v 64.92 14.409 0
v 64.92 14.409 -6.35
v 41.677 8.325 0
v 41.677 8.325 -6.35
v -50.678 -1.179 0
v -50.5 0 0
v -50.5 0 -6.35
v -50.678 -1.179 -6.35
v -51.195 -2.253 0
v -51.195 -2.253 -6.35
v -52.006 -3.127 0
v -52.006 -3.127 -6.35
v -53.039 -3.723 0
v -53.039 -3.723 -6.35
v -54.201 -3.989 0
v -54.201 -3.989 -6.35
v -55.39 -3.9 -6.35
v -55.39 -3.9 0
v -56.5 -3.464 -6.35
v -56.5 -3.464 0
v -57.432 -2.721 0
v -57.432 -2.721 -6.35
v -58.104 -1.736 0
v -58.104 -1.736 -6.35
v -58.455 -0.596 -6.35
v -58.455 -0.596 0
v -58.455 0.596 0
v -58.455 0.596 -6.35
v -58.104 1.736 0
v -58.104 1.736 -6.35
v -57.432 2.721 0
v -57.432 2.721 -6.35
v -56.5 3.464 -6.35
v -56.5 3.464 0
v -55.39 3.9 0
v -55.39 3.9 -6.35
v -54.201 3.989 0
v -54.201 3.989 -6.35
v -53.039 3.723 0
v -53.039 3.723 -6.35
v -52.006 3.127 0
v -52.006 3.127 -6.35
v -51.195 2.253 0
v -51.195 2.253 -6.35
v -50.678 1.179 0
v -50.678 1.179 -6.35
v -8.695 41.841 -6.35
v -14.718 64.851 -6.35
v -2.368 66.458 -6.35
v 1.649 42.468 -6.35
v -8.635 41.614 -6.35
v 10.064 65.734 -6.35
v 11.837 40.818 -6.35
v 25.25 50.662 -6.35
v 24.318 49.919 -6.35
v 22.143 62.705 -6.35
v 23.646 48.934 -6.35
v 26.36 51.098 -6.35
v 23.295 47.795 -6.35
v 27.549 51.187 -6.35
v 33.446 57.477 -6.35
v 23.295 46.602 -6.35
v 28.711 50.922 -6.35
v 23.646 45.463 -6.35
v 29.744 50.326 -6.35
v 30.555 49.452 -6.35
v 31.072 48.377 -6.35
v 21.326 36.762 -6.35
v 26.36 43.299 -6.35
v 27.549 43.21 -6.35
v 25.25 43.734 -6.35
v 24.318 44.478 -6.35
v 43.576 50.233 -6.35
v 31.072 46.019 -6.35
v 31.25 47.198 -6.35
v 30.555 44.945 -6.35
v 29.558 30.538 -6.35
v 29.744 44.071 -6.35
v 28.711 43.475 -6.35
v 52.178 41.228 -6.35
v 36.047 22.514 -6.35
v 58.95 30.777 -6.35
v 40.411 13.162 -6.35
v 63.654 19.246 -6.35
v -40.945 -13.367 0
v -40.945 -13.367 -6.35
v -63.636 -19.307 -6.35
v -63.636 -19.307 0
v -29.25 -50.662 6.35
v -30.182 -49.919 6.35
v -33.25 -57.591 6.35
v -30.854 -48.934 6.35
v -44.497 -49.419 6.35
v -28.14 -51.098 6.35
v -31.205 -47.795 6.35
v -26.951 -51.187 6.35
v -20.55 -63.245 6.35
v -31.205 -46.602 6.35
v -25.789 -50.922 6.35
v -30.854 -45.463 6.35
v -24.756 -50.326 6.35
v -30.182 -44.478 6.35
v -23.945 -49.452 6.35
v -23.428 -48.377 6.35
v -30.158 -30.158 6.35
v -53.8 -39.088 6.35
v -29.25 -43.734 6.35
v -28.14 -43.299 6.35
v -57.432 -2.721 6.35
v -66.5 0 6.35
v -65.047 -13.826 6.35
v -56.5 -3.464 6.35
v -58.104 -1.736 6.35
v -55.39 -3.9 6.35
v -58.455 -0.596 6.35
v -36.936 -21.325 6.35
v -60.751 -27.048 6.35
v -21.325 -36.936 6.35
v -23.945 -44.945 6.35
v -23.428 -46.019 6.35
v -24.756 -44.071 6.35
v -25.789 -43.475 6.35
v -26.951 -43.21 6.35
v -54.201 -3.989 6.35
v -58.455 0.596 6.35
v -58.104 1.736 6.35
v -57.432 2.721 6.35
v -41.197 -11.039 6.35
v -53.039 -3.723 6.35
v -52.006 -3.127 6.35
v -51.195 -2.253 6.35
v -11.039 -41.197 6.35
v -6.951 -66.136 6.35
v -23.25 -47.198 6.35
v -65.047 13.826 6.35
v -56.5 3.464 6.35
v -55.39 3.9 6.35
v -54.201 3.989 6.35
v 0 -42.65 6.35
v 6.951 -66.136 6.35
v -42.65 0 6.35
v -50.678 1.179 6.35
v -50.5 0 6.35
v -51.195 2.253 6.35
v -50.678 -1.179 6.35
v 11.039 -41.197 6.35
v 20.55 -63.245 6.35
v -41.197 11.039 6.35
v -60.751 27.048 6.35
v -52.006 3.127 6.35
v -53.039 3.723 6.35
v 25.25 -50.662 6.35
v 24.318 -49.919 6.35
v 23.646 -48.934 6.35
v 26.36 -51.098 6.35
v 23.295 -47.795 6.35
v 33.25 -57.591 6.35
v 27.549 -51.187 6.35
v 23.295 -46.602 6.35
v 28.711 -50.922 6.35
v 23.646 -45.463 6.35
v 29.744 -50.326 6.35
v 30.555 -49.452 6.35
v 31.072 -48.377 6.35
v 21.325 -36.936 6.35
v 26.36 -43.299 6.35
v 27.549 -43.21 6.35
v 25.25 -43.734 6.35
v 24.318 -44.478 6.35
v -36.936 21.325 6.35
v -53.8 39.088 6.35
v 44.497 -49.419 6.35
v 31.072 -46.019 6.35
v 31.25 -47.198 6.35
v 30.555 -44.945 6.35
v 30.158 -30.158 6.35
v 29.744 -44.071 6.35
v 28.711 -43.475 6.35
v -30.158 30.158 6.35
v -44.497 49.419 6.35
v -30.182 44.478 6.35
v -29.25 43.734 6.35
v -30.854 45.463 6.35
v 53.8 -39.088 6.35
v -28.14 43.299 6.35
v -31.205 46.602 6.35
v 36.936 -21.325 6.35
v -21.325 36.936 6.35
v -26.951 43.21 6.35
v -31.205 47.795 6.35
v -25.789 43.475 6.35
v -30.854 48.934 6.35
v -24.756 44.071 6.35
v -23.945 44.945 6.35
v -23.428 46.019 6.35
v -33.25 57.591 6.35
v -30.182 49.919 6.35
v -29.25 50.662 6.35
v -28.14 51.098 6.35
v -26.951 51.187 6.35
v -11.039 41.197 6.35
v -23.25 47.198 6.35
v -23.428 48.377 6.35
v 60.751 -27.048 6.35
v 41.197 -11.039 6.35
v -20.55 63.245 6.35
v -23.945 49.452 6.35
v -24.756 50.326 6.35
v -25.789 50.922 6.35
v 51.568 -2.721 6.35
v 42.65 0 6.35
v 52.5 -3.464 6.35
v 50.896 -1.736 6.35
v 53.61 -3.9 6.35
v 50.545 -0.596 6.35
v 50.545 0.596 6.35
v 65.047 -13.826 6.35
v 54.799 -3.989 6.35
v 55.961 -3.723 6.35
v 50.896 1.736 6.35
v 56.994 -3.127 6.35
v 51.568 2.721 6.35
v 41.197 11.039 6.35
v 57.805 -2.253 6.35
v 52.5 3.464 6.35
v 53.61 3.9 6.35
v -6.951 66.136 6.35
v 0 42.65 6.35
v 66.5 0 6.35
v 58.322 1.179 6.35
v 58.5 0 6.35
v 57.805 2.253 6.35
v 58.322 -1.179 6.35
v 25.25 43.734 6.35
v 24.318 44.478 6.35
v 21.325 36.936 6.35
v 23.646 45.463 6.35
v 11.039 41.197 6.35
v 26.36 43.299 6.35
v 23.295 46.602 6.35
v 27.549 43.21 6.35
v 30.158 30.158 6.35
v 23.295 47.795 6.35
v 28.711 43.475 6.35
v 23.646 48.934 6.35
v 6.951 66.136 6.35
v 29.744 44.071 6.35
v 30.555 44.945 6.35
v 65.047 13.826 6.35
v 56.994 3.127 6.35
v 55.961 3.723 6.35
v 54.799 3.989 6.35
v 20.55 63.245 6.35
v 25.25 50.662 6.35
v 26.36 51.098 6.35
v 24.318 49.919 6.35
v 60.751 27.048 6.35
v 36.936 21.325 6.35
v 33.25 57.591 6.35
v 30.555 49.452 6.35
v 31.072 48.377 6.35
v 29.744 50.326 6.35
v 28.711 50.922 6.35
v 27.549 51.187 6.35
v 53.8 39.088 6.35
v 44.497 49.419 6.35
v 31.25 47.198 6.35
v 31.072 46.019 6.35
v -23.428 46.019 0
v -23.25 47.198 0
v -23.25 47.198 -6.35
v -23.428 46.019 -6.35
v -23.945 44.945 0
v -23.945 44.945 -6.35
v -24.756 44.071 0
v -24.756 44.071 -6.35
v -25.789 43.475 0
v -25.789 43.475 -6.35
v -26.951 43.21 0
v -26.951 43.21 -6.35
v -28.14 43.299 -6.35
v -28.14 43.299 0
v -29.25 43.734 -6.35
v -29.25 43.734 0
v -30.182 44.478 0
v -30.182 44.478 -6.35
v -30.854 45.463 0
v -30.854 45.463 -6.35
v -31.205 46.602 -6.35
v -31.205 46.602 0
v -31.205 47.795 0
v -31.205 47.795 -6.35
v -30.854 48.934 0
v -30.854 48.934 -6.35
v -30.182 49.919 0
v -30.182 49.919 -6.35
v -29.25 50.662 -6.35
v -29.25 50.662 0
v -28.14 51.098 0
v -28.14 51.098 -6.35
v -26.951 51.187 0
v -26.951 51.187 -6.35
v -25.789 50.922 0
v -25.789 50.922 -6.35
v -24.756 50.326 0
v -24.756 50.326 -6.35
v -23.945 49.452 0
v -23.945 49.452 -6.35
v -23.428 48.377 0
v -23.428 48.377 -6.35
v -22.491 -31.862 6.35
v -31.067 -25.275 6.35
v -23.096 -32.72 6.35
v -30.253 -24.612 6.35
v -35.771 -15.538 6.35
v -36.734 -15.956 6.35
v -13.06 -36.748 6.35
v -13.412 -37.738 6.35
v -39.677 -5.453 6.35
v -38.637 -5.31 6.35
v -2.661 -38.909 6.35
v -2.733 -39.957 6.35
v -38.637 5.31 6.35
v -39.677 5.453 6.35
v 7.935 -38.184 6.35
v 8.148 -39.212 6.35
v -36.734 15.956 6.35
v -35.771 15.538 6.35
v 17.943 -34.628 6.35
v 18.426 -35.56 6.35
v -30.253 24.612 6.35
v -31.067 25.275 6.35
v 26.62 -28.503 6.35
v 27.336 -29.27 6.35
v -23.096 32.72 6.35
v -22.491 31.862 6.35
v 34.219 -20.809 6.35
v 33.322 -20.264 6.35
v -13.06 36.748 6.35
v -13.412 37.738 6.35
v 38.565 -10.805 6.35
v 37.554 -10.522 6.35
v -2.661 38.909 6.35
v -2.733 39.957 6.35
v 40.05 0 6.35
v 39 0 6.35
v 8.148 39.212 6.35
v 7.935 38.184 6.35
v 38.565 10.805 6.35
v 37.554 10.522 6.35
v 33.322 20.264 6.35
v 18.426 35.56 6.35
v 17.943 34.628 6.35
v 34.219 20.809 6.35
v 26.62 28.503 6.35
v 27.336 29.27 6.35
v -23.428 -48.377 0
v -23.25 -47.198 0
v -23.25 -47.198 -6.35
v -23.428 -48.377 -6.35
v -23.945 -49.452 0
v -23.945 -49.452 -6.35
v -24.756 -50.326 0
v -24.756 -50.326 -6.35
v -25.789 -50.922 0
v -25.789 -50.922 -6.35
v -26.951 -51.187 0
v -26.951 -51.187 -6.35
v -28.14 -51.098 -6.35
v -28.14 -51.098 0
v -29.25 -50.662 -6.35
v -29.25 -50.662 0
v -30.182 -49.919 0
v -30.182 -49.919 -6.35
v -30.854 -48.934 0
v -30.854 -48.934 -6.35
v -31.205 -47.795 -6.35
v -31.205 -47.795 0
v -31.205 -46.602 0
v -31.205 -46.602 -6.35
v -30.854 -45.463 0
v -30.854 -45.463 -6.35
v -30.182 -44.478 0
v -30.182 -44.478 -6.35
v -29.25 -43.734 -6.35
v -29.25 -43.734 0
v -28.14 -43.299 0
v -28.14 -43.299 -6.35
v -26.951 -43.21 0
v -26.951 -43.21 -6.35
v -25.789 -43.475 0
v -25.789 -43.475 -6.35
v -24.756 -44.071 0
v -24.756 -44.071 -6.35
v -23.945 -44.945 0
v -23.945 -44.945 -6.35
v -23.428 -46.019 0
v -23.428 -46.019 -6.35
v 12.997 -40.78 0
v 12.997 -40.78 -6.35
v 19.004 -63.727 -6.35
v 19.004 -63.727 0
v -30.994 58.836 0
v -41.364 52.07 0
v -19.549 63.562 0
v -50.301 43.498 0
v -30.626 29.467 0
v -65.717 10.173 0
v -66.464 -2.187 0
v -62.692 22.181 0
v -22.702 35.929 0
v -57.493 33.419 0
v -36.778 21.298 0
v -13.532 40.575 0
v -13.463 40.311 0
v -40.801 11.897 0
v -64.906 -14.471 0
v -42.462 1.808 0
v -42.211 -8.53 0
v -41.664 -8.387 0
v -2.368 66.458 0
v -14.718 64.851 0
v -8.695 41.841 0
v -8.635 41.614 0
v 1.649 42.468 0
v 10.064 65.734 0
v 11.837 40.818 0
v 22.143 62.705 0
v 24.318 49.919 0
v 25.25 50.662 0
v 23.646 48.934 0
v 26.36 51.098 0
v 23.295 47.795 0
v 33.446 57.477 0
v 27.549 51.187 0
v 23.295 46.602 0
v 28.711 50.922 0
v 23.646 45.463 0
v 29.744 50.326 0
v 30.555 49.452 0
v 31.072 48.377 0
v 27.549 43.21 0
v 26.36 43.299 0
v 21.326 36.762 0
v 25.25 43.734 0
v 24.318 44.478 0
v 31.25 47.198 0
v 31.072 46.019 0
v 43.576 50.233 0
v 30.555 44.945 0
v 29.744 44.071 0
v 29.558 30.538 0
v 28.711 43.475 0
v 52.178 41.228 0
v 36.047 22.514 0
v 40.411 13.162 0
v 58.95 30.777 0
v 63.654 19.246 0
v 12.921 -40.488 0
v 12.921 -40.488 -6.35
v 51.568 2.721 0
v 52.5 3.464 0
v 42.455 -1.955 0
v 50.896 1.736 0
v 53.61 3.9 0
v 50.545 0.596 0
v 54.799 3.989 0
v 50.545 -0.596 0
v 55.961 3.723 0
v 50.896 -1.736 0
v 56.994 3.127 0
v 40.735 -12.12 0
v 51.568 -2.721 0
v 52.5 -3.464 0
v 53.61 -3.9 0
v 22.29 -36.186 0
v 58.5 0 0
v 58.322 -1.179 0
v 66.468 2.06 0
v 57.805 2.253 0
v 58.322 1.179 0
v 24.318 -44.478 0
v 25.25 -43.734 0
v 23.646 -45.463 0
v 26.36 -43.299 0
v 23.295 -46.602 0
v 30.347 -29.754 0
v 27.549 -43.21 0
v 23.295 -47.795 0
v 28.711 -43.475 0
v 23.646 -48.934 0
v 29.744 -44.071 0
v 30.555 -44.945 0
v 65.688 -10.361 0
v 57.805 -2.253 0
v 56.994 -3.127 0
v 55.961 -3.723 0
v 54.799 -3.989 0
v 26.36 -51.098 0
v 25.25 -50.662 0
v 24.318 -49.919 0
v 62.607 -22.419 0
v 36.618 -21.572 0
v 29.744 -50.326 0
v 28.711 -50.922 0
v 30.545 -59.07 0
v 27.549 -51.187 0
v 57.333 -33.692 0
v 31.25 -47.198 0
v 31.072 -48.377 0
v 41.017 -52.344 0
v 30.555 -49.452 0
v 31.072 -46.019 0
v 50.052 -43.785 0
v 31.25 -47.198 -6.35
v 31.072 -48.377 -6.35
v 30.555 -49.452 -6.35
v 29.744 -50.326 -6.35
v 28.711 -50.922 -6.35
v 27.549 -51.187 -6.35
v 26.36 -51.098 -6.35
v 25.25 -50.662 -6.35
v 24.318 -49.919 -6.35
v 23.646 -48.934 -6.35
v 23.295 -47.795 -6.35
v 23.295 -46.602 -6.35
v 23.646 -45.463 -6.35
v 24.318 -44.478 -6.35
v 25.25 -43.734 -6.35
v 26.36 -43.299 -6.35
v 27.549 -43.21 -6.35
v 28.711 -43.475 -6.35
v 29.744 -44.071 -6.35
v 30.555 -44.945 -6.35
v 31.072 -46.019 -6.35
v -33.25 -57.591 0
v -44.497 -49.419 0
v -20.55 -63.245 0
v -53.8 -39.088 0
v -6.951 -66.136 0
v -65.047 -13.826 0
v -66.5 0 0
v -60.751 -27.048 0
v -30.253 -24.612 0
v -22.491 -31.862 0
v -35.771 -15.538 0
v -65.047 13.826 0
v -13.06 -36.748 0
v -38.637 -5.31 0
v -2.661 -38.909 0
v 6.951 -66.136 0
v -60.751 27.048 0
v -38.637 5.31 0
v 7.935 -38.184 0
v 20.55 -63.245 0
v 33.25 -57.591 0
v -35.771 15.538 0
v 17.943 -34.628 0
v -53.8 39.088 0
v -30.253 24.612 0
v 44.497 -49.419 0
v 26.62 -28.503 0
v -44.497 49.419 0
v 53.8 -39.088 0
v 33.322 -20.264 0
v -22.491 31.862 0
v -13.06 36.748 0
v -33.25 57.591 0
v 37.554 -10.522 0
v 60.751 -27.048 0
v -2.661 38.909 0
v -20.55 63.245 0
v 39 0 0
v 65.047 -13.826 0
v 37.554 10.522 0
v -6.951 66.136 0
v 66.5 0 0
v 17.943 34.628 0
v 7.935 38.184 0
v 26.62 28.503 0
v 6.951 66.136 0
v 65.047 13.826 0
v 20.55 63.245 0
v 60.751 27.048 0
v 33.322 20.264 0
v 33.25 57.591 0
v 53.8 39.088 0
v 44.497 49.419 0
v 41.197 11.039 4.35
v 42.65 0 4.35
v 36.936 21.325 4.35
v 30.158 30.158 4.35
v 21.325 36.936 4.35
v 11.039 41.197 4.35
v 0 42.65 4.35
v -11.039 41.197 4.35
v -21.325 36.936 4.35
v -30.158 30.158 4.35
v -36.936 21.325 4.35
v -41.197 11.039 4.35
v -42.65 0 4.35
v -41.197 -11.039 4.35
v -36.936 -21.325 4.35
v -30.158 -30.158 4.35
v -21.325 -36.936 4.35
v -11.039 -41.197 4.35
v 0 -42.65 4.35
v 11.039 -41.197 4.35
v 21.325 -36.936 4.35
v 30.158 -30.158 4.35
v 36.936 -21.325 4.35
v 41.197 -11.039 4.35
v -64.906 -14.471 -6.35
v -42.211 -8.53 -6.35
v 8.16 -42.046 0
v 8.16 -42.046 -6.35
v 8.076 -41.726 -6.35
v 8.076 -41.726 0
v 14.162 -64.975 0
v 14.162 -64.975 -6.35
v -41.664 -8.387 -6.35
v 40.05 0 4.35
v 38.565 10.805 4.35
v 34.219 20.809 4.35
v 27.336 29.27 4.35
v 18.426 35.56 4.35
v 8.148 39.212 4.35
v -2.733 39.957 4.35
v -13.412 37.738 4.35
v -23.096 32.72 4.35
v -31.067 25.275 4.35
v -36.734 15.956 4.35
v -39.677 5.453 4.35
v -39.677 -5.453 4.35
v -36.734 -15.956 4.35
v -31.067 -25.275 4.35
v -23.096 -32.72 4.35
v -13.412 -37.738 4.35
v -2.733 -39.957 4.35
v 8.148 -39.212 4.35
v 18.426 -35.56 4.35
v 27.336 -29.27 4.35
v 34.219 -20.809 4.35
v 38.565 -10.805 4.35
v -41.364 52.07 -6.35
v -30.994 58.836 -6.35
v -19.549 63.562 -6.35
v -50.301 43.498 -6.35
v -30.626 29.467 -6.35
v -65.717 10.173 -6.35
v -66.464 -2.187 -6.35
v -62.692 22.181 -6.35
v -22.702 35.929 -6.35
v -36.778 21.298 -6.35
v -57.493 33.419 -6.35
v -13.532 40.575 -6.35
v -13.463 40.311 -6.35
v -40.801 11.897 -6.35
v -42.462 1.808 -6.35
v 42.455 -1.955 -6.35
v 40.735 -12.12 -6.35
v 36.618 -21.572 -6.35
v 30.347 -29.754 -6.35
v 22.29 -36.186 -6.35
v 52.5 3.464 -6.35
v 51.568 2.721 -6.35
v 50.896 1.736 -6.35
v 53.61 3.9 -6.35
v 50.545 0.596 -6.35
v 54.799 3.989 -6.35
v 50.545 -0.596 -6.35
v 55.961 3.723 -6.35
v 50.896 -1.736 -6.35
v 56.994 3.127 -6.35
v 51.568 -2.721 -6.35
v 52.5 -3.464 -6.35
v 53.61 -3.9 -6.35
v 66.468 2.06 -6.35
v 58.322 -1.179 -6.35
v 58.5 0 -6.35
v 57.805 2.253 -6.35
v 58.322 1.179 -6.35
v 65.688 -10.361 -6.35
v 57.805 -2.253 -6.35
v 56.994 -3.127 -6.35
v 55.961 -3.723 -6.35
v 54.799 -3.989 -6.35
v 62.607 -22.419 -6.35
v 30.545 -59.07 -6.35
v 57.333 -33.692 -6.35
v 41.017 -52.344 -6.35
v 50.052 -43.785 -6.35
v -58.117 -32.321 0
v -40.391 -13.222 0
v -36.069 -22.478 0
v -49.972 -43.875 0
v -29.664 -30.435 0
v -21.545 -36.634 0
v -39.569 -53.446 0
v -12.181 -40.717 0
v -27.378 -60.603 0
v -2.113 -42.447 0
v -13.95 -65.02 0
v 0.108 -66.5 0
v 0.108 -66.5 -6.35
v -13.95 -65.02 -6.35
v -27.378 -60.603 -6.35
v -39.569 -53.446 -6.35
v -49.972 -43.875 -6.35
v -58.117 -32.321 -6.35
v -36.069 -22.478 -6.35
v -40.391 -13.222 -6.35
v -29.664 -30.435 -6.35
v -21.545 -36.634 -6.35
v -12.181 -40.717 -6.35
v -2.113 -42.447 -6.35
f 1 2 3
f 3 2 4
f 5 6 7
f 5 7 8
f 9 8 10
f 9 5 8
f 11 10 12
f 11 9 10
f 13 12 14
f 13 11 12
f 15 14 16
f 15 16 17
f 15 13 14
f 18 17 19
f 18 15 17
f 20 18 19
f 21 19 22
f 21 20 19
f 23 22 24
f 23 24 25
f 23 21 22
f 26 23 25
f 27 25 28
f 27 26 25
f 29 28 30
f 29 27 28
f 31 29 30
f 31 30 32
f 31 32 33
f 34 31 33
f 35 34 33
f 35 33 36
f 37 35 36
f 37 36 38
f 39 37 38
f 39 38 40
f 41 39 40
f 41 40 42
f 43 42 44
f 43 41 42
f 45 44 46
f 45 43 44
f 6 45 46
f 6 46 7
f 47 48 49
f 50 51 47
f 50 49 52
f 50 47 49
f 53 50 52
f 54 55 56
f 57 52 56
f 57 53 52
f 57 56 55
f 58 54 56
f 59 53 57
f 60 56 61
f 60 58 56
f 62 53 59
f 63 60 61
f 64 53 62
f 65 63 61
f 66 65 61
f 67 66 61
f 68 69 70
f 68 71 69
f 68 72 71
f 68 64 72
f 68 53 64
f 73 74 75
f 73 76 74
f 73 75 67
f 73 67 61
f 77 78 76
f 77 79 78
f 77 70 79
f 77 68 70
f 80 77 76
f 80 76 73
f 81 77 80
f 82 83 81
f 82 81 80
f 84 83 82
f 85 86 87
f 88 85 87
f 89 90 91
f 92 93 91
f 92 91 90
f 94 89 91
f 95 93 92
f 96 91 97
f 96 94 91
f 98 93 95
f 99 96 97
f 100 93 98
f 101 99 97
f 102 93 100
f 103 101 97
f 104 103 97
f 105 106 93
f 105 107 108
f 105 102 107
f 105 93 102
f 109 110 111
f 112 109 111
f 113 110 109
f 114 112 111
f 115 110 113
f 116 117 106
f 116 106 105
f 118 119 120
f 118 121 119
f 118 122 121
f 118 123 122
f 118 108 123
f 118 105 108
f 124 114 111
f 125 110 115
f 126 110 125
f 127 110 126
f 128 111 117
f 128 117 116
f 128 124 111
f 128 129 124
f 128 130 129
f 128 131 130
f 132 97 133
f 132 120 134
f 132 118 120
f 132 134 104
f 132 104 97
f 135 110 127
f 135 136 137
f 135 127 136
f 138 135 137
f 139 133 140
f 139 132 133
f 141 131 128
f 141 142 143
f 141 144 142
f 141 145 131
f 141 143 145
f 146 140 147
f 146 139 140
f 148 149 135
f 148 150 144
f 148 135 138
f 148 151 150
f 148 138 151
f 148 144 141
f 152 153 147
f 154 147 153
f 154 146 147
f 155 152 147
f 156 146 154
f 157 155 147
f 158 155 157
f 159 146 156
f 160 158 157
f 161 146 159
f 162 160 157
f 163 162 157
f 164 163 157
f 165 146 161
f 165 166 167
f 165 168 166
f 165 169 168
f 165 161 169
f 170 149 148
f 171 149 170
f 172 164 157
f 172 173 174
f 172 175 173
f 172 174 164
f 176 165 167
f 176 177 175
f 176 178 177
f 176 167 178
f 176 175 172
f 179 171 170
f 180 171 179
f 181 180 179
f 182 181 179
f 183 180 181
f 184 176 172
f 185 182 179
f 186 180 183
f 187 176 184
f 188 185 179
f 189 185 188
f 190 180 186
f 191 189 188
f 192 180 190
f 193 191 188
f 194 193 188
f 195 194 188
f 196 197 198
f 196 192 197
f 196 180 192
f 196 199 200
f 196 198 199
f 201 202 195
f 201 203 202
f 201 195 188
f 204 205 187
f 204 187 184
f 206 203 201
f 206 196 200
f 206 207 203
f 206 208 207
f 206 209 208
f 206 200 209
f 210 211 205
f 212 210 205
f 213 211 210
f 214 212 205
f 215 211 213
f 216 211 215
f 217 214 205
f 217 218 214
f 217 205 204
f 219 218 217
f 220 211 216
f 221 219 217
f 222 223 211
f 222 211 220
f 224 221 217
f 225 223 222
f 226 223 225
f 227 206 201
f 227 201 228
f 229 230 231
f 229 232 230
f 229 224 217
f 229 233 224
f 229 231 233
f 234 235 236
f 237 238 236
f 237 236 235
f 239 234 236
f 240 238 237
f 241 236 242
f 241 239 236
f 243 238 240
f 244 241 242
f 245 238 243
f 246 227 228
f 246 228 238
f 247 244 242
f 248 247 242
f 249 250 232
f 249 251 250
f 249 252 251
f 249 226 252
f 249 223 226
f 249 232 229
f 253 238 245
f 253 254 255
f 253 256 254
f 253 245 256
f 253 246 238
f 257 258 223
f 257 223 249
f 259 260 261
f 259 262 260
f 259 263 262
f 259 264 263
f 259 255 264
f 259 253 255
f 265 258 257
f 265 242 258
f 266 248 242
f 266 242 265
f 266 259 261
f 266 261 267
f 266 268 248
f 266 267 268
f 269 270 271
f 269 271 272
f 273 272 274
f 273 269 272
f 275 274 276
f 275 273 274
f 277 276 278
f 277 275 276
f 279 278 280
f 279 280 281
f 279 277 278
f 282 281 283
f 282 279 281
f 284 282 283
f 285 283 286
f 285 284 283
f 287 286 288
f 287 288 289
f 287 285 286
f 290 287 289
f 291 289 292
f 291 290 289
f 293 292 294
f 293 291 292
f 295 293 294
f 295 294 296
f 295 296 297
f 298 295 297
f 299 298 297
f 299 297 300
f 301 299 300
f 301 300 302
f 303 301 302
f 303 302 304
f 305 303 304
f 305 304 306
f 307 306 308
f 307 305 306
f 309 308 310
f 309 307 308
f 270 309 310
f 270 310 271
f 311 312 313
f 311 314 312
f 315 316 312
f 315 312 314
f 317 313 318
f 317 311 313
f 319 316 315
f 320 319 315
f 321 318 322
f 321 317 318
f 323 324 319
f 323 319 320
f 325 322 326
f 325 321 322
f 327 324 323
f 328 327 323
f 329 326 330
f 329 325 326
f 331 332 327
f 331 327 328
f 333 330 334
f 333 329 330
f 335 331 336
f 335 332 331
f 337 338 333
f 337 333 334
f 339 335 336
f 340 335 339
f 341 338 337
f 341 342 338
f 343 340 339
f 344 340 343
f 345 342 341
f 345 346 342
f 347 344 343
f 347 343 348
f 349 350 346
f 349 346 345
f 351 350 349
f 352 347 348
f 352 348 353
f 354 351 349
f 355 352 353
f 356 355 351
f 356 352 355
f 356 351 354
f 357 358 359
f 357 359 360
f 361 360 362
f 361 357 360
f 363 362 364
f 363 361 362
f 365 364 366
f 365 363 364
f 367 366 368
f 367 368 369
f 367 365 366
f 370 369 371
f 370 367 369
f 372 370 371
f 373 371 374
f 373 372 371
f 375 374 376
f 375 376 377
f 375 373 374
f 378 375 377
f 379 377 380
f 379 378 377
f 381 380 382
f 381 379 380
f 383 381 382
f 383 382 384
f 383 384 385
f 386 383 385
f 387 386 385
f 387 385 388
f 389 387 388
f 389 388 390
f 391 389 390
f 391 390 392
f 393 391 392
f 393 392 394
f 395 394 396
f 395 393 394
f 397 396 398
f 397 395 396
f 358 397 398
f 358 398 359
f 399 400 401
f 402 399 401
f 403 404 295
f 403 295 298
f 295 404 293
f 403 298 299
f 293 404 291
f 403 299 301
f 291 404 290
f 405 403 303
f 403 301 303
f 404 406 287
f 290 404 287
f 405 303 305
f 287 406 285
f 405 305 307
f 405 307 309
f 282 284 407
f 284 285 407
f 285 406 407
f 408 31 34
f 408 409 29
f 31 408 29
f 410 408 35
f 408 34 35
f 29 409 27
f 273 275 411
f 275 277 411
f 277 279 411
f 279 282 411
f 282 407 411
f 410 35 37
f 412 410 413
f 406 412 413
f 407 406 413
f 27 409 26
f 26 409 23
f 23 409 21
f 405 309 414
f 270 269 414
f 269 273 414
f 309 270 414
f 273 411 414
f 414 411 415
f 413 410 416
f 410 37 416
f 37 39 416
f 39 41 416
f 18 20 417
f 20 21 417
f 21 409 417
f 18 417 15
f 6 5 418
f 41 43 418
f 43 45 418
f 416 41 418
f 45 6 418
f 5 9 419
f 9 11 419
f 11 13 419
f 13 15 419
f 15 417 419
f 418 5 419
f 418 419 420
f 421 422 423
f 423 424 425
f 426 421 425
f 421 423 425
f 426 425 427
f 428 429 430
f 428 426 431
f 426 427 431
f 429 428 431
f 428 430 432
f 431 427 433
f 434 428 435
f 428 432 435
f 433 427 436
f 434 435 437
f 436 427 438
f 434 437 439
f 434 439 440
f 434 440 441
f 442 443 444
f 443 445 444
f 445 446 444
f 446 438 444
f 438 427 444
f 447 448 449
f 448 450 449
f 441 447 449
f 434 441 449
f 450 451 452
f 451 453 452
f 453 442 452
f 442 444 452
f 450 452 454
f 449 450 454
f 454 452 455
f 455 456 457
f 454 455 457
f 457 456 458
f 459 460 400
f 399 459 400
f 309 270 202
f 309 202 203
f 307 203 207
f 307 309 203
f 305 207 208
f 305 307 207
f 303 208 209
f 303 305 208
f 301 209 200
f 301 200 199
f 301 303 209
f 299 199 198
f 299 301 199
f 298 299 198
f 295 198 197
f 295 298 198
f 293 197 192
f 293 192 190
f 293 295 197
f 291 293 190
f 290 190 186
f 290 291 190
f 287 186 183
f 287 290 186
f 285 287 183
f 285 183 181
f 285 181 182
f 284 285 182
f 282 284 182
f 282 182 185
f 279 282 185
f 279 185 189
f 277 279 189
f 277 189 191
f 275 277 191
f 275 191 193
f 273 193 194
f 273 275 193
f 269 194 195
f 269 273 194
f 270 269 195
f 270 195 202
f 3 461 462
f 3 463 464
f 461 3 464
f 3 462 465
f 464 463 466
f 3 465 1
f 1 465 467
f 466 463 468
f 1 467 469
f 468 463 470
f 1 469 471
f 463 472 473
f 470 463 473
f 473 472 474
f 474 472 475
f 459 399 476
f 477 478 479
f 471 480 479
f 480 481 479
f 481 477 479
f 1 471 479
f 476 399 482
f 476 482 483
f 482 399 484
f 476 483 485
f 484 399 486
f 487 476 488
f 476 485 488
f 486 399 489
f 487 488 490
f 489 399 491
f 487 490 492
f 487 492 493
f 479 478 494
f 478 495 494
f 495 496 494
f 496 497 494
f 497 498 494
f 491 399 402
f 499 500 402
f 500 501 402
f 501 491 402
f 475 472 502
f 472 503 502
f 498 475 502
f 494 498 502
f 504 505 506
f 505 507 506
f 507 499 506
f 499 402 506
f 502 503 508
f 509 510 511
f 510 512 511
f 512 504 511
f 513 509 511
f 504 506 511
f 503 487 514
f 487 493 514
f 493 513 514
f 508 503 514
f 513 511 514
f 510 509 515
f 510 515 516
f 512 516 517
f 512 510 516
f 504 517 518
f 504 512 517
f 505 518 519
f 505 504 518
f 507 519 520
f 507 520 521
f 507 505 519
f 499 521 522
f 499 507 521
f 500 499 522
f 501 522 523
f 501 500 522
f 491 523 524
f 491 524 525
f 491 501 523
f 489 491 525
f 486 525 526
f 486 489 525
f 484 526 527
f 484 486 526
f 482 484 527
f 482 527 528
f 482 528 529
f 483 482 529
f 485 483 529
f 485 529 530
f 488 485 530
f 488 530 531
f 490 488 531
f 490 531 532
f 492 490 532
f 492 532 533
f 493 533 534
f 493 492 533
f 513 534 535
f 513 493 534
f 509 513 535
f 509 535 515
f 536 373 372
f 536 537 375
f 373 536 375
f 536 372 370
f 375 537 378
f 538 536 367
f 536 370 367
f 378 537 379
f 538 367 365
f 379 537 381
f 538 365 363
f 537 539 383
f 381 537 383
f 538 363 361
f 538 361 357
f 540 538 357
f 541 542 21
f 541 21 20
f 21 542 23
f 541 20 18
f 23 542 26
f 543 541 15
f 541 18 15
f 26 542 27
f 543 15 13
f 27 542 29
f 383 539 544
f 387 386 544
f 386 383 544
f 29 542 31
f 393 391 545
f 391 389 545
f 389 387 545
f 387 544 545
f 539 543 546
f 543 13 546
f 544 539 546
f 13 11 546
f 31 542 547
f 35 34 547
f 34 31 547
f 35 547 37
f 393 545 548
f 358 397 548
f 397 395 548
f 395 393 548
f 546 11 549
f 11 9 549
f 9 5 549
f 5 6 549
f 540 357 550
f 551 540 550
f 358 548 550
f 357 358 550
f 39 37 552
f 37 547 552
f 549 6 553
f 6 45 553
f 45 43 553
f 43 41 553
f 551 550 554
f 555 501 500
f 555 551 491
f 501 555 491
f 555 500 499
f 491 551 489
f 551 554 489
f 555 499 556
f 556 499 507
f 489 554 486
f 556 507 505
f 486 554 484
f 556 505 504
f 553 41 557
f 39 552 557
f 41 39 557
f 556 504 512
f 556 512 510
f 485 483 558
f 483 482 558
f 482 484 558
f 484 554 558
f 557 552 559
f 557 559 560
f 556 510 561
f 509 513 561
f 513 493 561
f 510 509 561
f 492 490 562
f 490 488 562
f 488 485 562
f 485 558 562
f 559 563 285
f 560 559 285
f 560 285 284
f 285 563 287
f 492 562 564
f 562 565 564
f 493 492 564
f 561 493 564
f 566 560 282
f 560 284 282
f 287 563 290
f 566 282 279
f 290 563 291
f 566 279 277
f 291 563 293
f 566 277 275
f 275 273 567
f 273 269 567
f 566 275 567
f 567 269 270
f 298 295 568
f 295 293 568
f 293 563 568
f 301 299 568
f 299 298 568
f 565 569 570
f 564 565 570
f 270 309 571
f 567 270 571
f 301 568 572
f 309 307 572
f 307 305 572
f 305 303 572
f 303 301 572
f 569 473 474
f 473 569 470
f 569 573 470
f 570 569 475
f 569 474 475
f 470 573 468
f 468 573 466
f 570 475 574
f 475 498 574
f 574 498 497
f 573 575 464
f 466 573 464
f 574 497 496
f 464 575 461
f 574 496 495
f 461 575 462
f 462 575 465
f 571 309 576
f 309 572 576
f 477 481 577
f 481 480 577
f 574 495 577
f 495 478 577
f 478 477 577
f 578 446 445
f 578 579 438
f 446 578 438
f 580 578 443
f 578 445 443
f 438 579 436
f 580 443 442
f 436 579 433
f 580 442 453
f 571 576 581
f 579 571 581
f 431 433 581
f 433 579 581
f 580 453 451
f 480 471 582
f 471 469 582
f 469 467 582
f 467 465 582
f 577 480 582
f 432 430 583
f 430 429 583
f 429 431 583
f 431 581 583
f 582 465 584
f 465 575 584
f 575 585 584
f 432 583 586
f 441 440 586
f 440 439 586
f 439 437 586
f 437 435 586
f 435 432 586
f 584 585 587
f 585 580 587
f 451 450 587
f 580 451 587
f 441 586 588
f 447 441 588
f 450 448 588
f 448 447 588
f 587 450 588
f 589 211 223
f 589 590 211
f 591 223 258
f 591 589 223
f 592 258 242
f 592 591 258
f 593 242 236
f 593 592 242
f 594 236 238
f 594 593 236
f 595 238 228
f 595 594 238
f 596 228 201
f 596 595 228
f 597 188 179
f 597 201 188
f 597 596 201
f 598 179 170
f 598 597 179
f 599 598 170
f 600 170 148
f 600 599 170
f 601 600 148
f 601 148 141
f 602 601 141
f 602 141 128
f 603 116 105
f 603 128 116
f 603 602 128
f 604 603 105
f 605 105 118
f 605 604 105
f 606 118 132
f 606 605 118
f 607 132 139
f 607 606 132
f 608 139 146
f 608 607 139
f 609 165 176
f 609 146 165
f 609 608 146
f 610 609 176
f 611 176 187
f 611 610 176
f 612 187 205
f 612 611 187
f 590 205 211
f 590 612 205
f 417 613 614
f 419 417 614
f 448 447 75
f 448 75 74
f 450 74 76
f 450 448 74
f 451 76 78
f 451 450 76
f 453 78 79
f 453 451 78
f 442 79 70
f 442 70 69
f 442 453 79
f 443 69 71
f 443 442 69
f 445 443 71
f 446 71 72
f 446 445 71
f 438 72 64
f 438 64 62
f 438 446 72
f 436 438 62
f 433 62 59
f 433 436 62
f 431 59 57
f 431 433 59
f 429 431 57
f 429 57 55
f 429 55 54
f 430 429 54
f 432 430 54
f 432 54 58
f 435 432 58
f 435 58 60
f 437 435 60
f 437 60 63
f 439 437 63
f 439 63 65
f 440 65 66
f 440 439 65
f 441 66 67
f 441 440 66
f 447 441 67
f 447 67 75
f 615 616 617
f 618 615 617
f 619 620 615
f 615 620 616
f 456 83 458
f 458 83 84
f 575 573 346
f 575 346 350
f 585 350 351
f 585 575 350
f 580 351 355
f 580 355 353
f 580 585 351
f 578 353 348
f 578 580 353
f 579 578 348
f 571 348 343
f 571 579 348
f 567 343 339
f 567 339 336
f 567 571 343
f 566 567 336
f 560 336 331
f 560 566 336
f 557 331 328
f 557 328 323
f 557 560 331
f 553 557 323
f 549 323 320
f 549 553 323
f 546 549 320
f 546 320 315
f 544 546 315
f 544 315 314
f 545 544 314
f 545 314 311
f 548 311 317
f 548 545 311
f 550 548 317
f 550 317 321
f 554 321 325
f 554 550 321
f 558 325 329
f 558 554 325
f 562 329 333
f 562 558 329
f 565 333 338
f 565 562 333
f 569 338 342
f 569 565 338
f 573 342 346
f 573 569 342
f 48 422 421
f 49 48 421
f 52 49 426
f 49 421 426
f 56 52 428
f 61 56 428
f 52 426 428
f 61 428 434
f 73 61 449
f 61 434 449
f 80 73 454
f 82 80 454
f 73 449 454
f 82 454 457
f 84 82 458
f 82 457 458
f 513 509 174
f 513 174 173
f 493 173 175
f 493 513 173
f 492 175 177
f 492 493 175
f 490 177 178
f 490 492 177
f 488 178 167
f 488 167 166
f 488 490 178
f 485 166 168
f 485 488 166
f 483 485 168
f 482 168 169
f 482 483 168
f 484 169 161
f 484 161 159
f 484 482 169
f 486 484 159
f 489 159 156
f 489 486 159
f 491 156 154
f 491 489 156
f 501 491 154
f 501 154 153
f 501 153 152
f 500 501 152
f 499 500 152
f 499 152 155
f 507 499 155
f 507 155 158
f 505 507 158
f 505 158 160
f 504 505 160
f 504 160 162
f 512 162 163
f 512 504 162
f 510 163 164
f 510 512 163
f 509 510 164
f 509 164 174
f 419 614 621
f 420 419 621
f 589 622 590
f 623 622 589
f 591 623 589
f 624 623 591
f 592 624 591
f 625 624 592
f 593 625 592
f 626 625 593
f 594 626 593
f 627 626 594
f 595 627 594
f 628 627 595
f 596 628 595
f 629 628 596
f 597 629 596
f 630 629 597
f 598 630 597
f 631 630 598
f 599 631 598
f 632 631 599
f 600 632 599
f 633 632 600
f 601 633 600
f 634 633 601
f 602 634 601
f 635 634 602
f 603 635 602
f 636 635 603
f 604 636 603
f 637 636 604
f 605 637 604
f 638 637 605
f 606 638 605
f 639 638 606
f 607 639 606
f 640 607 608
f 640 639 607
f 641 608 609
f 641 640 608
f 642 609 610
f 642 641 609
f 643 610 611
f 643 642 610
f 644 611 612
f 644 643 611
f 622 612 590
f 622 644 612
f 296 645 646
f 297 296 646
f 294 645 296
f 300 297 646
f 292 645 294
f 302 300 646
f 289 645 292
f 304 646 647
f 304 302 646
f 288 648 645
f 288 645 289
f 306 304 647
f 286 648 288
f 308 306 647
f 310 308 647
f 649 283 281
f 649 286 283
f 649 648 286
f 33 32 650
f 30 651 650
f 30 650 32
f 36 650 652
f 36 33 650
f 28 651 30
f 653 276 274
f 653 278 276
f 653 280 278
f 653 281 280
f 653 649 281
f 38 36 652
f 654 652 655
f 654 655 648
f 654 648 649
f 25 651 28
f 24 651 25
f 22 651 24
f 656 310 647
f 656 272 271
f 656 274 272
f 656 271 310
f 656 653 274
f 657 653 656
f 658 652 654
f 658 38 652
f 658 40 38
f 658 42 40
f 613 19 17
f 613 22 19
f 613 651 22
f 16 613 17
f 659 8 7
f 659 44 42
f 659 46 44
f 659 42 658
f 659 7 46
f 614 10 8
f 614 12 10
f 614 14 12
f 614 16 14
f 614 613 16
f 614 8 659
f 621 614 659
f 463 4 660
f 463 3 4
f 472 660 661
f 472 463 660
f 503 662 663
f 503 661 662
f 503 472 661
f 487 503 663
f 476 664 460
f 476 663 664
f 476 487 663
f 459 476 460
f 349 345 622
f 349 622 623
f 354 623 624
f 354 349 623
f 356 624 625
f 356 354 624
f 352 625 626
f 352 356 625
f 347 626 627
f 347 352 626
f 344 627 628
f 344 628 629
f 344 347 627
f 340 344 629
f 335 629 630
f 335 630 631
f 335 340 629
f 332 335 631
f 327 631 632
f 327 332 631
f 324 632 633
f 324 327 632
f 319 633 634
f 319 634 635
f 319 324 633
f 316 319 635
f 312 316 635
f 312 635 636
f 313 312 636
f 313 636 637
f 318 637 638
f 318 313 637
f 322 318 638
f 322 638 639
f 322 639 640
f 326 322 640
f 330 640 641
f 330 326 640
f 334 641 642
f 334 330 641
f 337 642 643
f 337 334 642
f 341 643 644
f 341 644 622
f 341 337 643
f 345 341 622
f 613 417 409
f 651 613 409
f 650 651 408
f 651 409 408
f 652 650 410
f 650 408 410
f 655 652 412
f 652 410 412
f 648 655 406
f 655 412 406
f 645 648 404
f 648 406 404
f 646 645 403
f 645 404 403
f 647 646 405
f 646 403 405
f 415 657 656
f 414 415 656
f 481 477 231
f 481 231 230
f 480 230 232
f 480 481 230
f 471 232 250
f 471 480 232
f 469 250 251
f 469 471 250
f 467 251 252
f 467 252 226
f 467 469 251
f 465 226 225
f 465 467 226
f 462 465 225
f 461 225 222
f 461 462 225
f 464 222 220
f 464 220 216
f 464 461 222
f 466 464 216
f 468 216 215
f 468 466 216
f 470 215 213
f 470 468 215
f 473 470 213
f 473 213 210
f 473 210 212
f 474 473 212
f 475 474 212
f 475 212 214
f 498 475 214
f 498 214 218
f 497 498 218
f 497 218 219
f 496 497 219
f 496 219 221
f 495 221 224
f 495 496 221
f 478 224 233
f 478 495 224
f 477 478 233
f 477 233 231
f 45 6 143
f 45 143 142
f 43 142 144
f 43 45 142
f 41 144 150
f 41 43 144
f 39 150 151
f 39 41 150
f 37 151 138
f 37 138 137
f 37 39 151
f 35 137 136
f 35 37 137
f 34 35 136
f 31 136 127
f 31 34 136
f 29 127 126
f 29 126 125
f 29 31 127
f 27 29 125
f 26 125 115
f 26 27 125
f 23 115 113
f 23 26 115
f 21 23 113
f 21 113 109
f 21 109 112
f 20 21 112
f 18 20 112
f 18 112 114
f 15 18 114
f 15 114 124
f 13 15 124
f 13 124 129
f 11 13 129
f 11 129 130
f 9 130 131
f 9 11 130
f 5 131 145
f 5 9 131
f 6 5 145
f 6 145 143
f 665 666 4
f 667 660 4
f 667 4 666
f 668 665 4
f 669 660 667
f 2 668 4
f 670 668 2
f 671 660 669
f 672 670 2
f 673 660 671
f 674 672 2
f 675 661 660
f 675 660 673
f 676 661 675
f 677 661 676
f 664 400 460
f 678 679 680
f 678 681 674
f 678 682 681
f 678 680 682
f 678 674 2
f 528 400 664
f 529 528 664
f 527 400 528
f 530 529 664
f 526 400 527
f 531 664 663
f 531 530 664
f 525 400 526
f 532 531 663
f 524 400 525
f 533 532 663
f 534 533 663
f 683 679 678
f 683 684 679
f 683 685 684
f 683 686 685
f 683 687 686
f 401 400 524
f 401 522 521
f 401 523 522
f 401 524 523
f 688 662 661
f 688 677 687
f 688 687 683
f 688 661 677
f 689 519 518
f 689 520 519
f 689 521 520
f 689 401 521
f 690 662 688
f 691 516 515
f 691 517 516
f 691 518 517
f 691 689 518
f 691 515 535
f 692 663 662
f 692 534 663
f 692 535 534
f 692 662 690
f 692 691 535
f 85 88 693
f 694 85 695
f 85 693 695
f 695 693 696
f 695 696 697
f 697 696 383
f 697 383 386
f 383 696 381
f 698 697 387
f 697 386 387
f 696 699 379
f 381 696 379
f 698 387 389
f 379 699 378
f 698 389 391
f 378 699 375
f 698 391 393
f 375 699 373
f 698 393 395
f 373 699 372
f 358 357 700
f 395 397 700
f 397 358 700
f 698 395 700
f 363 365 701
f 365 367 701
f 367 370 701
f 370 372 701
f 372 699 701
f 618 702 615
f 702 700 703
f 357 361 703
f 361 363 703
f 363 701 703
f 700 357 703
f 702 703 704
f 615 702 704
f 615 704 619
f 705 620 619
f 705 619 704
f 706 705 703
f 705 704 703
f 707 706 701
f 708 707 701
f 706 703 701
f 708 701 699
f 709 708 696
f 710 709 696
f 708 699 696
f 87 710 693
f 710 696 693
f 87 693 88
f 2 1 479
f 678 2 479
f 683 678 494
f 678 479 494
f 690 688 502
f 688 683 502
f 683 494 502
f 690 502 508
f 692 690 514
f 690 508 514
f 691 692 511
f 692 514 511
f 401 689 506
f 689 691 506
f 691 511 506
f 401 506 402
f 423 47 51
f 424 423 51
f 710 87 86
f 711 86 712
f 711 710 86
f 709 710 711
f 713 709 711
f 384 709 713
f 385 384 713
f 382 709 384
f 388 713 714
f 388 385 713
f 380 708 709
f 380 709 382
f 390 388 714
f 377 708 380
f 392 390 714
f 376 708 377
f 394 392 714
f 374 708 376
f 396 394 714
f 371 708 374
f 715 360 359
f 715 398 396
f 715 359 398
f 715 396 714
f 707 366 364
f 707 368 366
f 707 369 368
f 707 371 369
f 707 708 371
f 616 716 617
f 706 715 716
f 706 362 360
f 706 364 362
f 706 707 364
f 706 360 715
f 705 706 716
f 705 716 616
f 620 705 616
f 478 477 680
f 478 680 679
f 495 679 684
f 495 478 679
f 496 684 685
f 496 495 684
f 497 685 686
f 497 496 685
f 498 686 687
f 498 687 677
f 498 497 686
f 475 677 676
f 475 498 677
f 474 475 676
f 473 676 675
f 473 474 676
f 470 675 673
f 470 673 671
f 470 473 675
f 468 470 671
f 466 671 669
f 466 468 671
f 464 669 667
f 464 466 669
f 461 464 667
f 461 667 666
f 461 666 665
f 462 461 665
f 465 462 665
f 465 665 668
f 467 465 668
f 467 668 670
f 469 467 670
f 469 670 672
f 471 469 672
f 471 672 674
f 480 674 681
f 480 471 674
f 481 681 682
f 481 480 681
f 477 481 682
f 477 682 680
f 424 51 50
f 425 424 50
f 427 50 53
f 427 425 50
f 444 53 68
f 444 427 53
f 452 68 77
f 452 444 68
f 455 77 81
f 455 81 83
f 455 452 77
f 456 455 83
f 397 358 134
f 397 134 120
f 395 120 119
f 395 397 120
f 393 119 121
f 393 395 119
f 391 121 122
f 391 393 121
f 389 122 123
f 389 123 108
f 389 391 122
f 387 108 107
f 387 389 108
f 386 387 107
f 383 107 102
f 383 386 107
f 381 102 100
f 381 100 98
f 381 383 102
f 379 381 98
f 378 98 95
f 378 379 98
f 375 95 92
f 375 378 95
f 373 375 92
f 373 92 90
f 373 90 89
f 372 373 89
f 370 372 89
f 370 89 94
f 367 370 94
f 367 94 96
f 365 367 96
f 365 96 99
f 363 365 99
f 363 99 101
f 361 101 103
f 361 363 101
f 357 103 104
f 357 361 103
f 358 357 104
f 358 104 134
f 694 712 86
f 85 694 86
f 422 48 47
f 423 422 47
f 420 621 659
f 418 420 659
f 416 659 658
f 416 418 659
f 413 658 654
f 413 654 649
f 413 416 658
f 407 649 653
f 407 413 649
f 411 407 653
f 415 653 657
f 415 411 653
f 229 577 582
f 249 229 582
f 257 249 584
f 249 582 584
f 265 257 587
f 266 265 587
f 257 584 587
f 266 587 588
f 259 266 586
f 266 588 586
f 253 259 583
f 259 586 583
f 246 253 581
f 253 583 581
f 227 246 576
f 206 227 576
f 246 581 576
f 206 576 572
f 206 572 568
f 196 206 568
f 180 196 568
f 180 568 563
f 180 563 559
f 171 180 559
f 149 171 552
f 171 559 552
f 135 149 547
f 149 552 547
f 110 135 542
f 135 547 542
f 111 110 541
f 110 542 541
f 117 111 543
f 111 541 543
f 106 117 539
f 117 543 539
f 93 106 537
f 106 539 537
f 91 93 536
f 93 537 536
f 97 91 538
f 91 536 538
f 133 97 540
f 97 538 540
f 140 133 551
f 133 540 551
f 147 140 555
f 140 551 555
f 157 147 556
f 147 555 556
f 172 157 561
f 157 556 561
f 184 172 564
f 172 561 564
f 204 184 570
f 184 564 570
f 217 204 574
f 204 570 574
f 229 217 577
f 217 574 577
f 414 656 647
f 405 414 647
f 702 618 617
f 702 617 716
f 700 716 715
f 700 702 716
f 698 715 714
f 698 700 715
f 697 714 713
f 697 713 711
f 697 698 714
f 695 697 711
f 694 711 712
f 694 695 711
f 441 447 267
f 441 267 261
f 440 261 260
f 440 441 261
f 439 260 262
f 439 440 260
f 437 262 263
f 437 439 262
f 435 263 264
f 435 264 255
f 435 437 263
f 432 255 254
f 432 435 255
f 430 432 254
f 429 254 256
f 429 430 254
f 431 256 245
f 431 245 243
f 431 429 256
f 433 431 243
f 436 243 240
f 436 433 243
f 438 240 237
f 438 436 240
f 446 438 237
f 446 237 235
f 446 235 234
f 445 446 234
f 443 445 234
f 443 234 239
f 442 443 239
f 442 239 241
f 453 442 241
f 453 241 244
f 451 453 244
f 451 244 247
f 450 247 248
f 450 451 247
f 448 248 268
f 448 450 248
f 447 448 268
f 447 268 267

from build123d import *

# Parameters (mm, degrees)
F0_R     = 66.5
F0_R_2   = 4
F0_R_3   = 39
F1_DEPTH = 6.35
F3_W     = 2.6
F3_H     = 4
F6_R     = 66.5
F6_R_2   = 4
F6_R_3   = 42.5
F7_DEPTH = 6.35
F9_DEPTH = 6.35


with BuildPart() as f1:
    # F0 (on Top) → F1 (new body)
    with BuildSketch(Plane.XY):
        Circle(F0_R)
        with Locations((-27.25, -47.198385)):
            Circle(F0_R_2, mode=Mode.SUBTRACT)
        with Locations((27.25, -47.198385)):
            Circle(F0_R_2, mode=Mode.SUBTRACT)
        with Locations((-54.5, 0)):
            Circle(F0_R_2, mode=Mode.SUBTRACT)
        with Locations((-27.25, 47.198385)):
            Circle(F0_R_2, mode=Mode.SUBTRACT)
        Circle(F0_R_3, mode=Mode.SUBTRACT)
        with Locations((54.5, 0)):
            Circle(F0_R_2, mode=Mode.SUBTRACT)
        with Locations((27.25, 47.198385)):
            Circle(F0_R_2, mode=Mode.SUBTRACT)
    extrude(amount=F1_DEPTH)


with BuildPart() as f4:
    # F4: sweep along a path in F2
    with BuildLine(Plane.XY.offset(6.35)) as f4_path:
        CenterArc((0, 0), 41.35, 0, 360)
    # F3 (on Front) → F4 (sweep)
    with BuildSketch(Plane.XZ):
        with Locations((-41.35, 6.35)):
            Rectangle(F3_W, F3_H)
    sweep(path=f4_path.line)


with BuildPart() as f1_1:
    add(f1.part)

    # F5: cut F4
    add(f4.part, mode=Mode.SUBTRACT)


with BuildPart() as f7:
    # F6 (on face) → F7 (new body)
    with BuildSketch(Plane(origin=(0, 0, 0), x_dir=(1, 0, 0), z_dir=(0, 0, -1))):
        Circle(F6_R)
        with Locations((-27.25, -47.198385)):
            Circle(F6_R_2, mode=Mode.SUBTRACT)
        with Locations((27.25, -47.198385)):
            Circle(F6_R_2, mode=Mode.SUBTRACT)
        with Locations((-54.5, 0)):
            Circle(F6_R_2, mode=Mode.SUBTRACT)
        with Locations((-27.25, 47.198385)):
            Circle(F6_R_2, mode=Mode.SUBTRACT)
        Circle(F6_R_3, mode=Mode.SUBTRACT)
        with Locations((54.5, 0)):
            Circle(F6_R_2, mode=Mode.SUBTRACT)
        with Locations((27.25, 47.198385)):
            Circle(F6_R_2, mode=Mode.SUBTRACT)
    extrude(amount=F7_DEPTH)

    # F8 (on face) → F9 (cut, through all)
    with BuildSketch(Plane(origin=(0, 0, -6.35), x_dir=(1, 0, 0), z_dir=(0, 0, -1))):
        Polygon((66.854972, -14.915586), (64.920158, -14.409133), (41.676671, -8.324968), (39.741857, -7.818515), (38.475725, -12.65555), (40.410539, -13.162003), (63.654026, -19.246168), (65.58884, -19.752621), align=None)
        Polygon((7.653846, 40.111613), (12.490881, 38.845481), (12.997334, 40.780295), (19.081498, 64.023782), (19.587951, 65.958596), (14.750916, 67.224728), (14.244463, 65.289913), (8.160298, 42.046427), align=None)
        Polygon((-40.276282, 8.023601), (-39.01015, 12.860636), (-40.944964, 13.367089), (-64.188451, 19.451254), (-66.123265, 19.957707), (-67.389397, 15.120672), (-65.454583, 14.614219), (-42.211096, 8.530054), align=None)
        Polygon((-8.188271, -39.906526), (-13.025306, -38.640395), (-13.531759, -40.575209), (-19.615924, -63.818695), (-20.122376, -65.75351), (-15.285341, -67.019641), (-14.778888, -65.084827), (-8.694723, -41.841341), align=None)
    extrude(amount=-F9_DEPTH, mode=Mode.SUBTRACT)


solid = Compound([f1_1.part, f7.part])
